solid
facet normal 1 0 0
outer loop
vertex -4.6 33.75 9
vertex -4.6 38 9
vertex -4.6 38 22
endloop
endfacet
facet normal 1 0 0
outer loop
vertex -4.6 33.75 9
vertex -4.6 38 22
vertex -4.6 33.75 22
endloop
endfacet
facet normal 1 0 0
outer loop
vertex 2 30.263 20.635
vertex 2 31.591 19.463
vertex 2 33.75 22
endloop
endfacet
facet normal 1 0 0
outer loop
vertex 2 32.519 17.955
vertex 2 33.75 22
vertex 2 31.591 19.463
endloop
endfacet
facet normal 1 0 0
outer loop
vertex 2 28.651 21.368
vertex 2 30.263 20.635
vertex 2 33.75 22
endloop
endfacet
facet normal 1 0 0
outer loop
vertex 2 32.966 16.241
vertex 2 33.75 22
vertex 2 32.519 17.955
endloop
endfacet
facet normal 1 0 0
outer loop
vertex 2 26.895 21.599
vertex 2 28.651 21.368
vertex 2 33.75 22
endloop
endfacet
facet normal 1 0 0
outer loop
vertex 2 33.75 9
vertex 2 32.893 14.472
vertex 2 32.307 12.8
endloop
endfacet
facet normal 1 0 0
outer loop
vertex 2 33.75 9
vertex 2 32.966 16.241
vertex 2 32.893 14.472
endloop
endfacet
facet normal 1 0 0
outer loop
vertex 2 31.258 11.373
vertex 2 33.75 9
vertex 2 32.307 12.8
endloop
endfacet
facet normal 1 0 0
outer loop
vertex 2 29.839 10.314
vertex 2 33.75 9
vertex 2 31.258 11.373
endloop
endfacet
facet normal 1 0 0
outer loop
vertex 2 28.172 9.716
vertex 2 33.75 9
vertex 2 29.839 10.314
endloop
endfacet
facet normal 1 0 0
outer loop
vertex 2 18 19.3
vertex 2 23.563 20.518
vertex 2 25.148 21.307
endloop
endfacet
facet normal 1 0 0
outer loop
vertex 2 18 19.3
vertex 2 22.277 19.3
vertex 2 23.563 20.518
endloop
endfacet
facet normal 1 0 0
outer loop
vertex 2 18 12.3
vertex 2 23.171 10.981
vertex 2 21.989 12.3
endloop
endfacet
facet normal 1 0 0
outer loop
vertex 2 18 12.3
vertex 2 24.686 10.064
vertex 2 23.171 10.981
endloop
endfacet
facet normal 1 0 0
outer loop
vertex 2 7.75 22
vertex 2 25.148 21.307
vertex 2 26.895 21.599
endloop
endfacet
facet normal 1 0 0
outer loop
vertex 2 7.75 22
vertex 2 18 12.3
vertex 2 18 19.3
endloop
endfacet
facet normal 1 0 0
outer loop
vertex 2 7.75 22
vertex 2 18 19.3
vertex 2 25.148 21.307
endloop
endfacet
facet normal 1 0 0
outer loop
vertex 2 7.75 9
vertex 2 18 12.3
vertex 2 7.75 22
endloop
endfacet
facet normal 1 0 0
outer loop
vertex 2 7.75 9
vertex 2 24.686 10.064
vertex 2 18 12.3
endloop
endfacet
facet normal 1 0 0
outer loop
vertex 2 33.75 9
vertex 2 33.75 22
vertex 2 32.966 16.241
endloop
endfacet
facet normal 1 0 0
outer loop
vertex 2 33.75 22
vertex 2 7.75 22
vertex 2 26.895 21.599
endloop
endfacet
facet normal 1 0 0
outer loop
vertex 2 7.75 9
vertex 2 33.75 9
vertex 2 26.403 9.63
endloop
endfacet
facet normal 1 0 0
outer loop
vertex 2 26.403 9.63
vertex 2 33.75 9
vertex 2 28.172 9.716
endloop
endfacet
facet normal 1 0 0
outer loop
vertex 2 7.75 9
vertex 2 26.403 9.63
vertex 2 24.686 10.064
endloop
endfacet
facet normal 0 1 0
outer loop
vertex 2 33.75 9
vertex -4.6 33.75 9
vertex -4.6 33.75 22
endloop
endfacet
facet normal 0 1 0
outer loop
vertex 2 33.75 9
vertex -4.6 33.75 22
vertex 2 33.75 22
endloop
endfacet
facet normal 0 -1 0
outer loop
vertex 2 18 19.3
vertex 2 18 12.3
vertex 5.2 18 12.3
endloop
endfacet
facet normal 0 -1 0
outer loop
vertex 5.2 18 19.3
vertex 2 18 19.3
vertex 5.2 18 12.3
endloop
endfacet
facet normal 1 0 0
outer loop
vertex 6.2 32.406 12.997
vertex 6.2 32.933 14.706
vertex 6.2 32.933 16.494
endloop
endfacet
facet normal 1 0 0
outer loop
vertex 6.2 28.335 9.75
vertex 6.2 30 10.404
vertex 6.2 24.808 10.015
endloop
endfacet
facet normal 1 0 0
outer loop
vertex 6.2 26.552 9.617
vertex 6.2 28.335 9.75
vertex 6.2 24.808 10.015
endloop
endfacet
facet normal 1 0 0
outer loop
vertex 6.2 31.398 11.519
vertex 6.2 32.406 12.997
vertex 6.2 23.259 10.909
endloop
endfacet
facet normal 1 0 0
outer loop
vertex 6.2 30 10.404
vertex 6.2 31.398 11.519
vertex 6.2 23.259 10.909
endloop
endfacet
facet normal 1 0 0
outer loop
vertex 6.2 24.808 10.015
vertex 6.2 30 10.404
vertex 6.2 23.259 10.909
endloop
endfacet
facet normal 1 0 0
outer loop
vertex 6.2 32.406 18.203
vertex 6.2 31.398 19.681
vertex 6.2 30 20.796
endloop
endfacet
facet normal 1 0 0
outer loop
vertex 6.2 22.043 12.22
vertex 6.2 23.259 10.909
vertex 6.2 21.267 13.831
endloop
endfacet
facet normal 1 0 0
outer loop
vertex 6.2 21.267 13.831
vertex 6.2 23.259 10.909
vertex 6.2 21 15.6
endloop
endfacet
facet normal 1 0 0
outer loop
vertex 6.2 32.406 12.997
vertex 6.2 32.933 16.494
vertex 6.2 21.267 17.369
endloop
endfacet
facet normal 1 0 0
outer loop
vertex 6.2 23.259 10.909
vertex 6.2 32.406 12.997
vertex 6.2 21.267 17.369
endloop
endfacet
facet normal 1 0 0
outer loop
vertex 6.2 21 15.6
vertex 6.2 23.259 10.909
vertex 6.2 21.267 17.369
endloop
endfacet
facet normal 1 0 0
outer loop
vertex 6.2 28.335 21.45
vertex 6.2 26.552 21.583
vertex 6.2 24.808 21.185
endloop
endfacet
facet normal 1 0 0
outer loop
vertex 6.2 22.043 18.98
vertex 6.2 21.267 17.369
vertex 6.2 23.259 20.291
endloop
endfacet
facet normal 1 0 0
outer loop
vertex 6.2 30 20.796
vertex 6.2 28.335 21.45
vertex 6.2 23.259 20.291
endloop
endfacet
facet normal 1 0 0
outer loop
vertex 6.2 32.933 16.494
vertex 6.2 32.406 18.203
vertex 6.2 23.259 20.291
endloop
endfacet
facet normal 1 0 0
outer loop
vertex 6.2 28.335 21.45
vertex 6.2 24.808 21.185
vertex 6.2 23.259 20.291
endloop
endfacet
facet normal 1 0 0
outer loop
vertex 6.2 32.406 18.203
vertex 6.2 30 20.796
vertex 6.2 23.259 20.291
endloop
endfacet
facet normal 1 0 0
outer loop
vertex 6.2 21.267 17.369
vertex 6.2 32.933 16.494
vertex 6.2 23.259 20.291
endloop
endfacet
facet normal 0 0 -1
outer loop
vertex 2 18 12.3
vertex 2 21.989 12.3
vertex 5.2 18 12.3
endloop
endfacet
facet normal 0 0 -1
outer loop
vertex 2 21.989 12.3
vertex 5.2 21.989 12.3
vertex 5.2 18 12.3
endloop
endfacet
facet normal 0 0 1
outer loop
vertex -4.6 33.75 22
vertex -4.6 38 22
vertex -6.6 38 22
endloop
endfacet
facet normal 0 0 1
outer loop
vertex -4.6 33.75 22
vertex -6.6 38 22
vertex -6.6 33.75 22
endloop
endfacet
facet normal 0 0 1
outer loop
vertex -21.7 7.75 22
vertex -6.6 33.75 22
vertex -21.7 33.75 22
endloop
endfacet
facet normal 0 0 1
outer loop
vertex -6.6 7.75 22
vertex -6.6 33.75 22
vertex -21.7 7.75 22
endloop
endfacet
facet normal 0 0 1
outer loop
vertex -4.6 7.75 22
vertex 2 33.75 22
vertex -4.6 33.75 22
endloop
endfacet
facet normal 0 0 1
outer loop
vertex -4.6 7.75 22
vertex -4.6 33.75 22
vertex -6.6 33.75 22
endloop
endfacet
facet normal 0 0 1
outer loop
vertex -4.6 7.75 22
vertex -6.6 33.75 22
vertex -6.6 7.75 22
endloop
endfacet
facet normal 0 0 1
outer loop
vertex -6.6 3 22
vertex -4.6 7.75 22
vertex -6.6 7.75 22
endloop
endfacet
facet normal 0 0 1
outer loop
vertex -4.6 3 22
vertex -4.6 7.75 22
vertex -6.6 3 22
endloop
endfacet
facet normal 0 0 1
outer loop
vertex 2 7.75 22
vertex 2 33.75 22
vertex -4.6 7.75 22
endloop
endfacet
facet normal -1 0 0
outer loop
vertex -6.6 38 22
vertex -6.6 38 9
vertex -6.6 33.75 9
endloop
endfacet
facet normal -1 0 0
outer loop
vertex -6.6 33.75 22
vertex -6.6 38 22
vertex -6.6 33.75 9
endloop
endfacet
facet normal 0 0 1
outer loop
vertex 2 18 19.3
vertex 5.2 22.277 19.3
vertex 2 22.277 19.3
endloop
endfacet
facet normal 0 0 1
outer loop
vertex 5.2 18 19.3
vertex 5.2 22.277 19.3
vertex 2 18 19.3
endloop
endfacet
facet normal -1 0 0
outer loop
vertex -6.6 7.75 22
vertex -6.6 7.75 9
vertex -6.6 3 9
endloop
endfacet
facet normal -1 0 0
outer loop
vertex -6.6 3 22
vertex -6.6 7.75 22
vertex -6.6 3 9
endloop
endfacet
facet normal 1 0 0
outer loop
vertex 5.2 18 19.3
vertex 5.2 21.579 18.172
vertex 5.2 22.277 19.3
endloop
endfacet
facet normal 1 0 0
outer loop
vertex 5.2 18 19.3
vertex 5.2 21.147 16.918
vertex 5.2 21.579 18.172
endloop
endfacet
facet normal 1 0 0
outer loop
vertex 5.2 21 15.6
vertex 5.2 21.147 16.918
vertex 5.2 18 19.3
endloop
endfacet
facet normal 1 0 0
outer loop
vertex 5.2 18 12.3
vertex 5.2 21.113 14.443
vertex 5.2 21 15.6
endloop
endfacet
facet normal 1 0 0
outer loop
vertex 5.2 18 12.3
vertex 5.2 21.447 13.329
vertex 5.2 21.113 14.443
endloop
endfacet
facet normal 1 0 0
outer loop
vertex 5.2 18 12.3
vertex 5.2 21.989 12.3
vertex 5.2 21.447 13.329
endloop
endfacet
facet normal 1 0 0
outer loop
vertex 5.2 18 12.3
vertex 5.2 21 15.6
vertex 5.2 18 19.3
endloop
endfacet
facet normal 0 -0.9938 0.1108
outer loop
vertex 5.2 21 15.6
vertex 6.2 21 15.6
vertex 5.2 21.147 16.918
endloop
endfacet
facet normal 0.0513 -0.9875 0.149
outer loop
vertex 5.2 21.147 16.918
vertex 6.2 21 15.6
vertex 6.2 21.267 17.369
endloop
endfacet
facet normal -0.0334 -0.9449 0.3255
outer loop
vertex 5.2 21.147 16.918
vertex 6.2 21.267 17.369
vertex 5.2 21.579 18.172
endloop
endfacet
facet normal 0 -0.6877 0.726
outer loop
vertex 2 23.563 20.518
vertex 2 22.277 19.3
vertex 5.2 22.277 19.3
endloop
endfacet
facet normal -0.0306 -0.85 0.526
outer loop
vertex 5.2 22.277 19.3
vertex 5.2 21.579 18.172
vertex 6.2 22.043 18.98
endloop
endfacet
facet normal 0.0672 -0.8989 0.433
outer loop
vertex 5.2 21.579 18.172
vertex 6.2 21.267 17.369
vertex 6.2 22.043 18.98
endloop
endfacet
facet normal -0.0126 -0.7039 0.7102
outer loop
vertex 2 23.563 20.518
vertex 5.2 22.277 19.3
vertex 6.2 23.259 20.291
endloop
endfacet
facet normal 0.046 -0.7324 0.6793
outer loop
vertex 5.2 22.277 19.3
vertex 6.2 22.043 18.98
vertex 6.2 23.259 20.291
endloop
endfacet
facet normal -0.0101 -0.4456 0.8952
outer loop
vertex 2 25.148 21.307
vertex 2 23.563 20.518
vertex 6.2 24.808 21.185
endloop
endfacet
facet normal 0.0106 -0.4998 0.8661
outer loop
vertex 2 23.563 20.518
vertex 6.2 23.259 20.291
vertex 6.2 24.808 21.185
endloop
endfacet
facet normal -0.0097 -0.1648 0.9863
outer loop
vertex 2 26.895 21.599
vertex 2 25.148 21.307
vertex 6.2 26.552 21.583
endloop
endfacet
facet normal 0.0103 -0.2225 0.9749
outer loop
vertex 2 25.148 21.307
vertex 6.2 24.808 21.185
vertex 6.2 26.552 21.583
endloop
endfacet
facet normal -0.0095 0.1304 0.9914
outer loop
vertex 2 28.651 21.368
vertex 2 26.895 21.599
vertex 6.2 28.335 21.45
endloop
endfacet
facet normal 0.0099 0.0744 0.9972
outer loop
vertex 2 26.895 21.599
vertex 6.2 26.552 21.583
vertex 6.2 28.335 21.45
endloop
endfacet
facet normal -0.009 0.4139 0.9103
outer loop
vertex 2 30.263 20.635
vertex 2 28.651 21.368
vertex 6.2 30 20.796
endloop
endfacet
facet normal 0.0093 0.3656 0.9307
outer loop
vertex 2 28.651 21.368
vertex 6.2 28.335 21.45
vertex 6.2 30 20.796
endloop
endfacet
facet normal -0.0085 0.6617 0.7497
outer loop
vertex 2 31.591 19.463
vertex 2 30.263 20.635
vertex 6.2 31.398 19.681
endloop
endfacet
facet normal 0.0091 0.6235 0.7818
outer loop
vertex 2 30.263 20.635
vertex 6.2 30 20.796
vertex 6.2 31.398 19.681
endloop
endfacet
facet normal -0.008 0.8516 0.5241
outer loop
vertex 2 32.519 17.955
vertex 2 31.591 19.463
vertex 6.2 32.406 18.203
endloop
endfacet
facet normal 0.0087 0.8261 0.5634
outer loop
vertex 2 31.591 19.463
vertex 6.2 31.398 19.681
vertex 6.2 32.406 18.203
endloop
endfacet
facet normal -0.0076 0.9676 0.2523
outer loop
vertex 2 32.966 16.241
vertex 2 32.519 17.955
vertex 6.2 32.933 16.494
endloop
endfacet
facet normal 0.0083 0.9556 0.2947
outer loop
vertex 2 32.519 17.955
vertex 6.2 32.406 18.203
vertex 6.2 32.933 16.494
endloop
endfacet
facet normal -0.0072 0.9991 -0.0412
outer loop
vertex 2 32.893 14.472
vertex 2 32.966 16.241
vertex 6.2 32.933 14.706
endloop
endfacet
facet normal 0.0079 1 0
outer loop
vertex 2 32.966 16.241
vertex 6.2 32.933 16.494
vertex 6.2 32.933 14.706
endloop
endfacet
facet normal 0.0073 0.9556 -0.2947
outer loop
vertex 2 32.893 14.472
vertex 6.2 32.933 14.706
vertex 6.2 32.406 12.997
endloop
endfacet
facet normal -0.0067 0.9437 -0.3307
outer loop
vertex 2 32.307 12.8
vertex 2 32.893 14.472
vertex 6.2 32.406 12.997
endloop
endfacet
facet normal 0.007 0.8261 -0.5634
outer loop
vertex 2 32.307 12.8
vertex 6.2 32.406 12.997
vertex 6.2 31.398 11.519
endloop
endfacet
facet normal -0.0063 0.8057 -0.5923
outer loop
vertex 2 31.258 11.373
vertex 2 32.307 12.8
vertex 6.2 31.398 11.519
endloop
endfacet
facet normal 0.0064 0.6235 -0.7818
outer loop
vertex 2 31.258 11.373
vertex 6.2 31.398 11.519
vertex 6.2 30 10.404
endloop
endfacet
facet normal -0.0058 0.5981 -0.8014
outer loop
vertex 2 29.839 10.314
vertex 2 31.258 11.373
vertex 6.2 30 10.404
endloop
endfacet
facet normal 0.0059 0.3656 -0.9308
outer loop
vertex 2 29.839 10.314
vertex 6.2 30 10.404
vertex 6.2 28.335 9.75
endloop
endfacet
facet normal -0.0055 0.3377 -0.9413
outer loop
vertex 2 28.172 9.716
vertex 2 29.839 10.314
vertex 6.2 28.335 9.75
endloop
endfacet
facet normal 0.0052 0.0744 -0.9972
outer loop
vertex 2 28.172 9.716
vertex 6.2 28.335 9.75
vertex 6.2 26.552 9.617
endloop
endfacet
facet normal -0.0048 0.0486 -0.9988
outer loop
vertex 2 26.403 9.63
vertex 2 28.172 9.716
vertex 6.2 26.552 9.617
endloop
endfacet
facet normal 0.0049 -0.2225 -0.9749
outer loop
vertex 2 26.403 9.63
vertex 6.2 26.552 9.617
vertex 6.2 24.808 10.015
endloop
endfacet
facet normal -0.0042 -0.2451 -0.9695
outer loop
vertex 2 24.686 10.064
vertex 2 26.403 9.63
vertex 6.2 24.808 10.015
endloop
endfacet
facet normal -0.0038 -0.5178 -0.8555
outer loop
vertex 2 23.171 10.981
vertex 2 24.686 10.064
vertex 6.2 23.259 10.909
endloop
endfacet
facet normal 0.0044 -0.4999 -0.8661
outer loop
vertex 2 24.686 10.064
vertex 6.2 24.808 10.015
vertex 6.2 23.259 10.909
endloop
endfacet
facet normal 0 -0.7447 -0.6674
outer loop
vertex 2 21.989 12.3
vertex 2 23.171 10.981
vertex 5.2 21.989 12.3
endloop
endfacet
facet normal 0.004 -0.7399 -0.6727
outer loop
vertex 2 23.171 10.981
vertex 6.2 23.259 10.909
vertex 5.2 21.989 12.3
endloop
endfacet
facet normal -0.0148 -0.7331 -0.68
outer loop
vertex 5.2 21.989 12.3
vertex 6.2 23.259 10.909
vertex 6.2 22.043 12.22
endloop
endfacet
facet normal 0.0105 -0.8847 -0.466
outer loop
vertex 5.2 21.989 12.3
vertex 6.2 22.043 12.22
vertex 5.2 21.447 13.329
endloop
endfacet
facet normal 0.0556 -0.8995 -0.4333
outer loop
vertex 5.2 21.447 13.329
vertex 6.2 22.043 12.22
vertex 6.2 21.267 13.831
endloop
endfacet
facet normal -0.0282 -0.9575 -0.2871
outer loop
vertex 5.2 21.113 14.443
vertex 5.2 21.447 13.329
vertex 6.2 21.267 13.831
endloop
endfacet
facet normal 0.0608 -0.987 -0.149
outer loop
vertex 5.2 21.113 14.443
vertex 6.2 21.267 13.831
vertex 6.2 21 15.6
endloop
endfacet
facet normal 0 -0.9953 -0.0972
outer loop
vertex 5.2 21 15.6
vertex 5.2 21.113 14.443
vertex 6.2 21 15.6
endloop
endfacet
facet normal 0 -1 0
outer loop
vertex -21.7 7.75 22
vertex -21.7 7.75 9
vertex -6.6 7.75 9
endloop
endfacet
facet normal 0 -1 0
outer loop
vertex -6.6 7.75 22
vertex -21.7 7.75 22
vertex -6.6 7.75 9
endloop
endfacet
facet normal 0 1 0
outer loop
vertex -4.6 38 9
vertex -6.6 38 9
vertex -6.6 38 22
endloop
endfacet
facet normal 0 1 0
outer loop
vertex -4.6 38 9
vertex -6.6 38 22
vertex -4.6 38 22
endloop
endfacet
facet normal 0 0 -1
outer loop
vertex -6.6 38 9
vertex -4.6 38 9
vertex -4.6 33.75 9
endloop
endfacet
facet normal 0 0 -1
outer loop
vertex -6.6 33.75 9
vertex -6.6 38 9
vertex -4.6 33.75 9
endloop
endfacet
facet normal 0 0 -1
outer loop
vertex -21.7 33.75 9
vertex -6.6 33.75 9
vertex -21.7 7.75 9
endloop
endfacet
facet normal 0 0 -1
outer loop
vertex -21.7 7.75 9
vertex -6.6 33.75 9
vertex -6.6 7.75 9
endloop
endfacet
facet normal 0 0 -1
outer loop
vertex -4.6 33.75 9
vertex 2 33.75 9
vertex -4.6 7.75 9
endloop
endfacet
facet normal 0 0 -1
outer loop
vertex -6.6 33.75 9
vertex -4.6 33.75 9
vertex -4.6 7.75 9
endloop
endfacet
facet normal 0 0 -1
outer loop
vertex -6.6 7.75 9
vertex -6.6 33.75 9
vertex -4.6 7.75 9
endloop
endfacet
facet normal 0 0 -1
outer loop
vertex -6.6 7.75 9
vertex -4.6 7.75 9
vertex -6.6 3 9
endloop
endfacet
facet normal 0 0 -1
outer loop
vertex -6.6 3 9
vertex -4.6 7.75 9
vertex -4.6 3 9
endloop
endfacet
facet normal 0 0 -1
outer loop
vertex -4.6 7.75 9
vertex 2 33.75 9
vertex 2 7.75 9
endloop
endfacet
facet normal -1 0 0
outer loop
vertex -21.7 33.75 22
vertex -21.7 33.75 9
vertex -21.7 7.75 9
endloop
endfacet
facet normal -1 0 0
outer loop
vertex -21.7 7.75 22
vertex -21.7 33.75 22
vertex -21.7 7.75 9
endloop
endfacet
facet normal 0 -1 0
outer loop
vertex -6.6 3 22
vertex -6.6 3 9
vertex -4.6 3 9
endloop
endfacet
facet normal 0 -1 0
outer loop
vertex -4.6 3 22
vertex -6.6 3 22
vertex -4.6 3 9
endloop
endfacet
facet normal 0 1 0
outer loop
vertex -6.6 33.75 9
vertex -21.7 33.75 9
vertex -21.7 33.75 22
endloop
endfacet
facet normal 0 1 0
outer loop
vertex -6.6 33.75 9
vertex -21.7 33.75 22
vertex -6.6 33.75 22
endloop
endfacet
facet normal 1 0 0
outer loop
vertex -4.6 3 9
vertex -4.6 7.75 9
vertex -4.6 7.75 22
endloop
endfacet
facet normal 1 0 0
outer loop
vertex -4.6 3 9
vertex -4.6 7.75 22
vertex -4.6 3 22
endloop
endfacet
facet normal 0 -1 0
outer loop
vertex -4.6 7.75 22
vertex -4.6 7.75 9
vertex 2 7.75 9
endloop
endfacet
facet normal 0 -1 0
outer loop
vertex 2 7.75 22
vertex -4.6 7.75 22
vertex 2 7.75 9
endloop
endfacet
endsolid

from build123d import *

# Parameters (mm, degrees)
BOX010_W                  = 10
BOX010_H                  = 10
BOX010_DEPTH              = 7
CYLINDER003_R             = 6
CYLINDER003_DEPTH         = 6
CYLINDER003_ROLL_ANGLE    = 90
BOX009_W                  = 26
BOX009_H                  = 23.7
BOX009_DEPTH              = 13
BOX008_W                  = 35
BOX008_H                  = 2
BOX008_DEPTH              = 13
FUSION005_PLACEMENT_ANGLE = -90


with BuildPart() as cube002:
    # Box010 → Box010 (new body)
    with BuildSketch(Plane(origin=(-32, 3.3, 1.3), x_dir=(1, 0, 0), z_dir=(0, 0, 1))):
        with Locations((5, 5)):
            Rectangle(BOX010_W, BOX010_H)
    extrude(amount=BOX010_DEPTH)


with BuildPart() as cylinder003:
    # Cylinder003 → Cylinder003 (new body)
    with BuildSketch(Plane.XY):
        Circle(CYLINDER003_R)
    extrude(amount=CYLINDER003_DEPTH)


with BuildPart() as cylinder003_1:
    # Cylinder003 roll: moved
    add(cylinder003.part.rotate(Axis((0, 0, 0), (1, 0, 0)), CYLINDER003_ROLL_ANGLE))


with BuildPart() as cylinder003_2:
    # Cylinder003 placement: moved
    add(cylinder003_1.part.moved(Location((-31, 14.3, 4.6))))


with BuildPart() as cube001:
    # Box009 → Box009 (new body)
    with BuildSketch(Plane(origin=(-37.75, -13.6, -2), x_dir=(1, 0, 0), z_dir=(0, 0, 1))):
        with Locations((13, 11.85)):
            Rectangle(BOX009_W, BOX009_H)
    extrude(amount=BOX009_DEPTH)


with BuildPart() as simple_servo_rev_eng:
    # Box008 → Box008 (new body)
    with BuildSketch(Plane(origin=(-42, 1.5, -2), x_dir=(1, 0, 0), z_dir=(0, 0, 1))):
        with Locations((17.5, 1)):
            Rectangle(BOX008_W, BOX008_H)
    extrude(amount=BOX008_DEPTH)

    # Fusion005: union Cube002, Cylinder003, Cube001
    add(cube002.part)
    add(cylinder003_2.part)
    add(cube001.part)


with BuildPart() as simple_servo_rev_eng_1:
    # Fusion005 placement: moved
    add(simple_servo_rev_eng.part.moved(Location((-8.1, -4, 11))).rotate(Axis((-8.1, -4, 11), (0, 0, 1)), FUSION005_PLACEMENT_ANGLE))


solid = simple_servo_rev_eng_1.part
